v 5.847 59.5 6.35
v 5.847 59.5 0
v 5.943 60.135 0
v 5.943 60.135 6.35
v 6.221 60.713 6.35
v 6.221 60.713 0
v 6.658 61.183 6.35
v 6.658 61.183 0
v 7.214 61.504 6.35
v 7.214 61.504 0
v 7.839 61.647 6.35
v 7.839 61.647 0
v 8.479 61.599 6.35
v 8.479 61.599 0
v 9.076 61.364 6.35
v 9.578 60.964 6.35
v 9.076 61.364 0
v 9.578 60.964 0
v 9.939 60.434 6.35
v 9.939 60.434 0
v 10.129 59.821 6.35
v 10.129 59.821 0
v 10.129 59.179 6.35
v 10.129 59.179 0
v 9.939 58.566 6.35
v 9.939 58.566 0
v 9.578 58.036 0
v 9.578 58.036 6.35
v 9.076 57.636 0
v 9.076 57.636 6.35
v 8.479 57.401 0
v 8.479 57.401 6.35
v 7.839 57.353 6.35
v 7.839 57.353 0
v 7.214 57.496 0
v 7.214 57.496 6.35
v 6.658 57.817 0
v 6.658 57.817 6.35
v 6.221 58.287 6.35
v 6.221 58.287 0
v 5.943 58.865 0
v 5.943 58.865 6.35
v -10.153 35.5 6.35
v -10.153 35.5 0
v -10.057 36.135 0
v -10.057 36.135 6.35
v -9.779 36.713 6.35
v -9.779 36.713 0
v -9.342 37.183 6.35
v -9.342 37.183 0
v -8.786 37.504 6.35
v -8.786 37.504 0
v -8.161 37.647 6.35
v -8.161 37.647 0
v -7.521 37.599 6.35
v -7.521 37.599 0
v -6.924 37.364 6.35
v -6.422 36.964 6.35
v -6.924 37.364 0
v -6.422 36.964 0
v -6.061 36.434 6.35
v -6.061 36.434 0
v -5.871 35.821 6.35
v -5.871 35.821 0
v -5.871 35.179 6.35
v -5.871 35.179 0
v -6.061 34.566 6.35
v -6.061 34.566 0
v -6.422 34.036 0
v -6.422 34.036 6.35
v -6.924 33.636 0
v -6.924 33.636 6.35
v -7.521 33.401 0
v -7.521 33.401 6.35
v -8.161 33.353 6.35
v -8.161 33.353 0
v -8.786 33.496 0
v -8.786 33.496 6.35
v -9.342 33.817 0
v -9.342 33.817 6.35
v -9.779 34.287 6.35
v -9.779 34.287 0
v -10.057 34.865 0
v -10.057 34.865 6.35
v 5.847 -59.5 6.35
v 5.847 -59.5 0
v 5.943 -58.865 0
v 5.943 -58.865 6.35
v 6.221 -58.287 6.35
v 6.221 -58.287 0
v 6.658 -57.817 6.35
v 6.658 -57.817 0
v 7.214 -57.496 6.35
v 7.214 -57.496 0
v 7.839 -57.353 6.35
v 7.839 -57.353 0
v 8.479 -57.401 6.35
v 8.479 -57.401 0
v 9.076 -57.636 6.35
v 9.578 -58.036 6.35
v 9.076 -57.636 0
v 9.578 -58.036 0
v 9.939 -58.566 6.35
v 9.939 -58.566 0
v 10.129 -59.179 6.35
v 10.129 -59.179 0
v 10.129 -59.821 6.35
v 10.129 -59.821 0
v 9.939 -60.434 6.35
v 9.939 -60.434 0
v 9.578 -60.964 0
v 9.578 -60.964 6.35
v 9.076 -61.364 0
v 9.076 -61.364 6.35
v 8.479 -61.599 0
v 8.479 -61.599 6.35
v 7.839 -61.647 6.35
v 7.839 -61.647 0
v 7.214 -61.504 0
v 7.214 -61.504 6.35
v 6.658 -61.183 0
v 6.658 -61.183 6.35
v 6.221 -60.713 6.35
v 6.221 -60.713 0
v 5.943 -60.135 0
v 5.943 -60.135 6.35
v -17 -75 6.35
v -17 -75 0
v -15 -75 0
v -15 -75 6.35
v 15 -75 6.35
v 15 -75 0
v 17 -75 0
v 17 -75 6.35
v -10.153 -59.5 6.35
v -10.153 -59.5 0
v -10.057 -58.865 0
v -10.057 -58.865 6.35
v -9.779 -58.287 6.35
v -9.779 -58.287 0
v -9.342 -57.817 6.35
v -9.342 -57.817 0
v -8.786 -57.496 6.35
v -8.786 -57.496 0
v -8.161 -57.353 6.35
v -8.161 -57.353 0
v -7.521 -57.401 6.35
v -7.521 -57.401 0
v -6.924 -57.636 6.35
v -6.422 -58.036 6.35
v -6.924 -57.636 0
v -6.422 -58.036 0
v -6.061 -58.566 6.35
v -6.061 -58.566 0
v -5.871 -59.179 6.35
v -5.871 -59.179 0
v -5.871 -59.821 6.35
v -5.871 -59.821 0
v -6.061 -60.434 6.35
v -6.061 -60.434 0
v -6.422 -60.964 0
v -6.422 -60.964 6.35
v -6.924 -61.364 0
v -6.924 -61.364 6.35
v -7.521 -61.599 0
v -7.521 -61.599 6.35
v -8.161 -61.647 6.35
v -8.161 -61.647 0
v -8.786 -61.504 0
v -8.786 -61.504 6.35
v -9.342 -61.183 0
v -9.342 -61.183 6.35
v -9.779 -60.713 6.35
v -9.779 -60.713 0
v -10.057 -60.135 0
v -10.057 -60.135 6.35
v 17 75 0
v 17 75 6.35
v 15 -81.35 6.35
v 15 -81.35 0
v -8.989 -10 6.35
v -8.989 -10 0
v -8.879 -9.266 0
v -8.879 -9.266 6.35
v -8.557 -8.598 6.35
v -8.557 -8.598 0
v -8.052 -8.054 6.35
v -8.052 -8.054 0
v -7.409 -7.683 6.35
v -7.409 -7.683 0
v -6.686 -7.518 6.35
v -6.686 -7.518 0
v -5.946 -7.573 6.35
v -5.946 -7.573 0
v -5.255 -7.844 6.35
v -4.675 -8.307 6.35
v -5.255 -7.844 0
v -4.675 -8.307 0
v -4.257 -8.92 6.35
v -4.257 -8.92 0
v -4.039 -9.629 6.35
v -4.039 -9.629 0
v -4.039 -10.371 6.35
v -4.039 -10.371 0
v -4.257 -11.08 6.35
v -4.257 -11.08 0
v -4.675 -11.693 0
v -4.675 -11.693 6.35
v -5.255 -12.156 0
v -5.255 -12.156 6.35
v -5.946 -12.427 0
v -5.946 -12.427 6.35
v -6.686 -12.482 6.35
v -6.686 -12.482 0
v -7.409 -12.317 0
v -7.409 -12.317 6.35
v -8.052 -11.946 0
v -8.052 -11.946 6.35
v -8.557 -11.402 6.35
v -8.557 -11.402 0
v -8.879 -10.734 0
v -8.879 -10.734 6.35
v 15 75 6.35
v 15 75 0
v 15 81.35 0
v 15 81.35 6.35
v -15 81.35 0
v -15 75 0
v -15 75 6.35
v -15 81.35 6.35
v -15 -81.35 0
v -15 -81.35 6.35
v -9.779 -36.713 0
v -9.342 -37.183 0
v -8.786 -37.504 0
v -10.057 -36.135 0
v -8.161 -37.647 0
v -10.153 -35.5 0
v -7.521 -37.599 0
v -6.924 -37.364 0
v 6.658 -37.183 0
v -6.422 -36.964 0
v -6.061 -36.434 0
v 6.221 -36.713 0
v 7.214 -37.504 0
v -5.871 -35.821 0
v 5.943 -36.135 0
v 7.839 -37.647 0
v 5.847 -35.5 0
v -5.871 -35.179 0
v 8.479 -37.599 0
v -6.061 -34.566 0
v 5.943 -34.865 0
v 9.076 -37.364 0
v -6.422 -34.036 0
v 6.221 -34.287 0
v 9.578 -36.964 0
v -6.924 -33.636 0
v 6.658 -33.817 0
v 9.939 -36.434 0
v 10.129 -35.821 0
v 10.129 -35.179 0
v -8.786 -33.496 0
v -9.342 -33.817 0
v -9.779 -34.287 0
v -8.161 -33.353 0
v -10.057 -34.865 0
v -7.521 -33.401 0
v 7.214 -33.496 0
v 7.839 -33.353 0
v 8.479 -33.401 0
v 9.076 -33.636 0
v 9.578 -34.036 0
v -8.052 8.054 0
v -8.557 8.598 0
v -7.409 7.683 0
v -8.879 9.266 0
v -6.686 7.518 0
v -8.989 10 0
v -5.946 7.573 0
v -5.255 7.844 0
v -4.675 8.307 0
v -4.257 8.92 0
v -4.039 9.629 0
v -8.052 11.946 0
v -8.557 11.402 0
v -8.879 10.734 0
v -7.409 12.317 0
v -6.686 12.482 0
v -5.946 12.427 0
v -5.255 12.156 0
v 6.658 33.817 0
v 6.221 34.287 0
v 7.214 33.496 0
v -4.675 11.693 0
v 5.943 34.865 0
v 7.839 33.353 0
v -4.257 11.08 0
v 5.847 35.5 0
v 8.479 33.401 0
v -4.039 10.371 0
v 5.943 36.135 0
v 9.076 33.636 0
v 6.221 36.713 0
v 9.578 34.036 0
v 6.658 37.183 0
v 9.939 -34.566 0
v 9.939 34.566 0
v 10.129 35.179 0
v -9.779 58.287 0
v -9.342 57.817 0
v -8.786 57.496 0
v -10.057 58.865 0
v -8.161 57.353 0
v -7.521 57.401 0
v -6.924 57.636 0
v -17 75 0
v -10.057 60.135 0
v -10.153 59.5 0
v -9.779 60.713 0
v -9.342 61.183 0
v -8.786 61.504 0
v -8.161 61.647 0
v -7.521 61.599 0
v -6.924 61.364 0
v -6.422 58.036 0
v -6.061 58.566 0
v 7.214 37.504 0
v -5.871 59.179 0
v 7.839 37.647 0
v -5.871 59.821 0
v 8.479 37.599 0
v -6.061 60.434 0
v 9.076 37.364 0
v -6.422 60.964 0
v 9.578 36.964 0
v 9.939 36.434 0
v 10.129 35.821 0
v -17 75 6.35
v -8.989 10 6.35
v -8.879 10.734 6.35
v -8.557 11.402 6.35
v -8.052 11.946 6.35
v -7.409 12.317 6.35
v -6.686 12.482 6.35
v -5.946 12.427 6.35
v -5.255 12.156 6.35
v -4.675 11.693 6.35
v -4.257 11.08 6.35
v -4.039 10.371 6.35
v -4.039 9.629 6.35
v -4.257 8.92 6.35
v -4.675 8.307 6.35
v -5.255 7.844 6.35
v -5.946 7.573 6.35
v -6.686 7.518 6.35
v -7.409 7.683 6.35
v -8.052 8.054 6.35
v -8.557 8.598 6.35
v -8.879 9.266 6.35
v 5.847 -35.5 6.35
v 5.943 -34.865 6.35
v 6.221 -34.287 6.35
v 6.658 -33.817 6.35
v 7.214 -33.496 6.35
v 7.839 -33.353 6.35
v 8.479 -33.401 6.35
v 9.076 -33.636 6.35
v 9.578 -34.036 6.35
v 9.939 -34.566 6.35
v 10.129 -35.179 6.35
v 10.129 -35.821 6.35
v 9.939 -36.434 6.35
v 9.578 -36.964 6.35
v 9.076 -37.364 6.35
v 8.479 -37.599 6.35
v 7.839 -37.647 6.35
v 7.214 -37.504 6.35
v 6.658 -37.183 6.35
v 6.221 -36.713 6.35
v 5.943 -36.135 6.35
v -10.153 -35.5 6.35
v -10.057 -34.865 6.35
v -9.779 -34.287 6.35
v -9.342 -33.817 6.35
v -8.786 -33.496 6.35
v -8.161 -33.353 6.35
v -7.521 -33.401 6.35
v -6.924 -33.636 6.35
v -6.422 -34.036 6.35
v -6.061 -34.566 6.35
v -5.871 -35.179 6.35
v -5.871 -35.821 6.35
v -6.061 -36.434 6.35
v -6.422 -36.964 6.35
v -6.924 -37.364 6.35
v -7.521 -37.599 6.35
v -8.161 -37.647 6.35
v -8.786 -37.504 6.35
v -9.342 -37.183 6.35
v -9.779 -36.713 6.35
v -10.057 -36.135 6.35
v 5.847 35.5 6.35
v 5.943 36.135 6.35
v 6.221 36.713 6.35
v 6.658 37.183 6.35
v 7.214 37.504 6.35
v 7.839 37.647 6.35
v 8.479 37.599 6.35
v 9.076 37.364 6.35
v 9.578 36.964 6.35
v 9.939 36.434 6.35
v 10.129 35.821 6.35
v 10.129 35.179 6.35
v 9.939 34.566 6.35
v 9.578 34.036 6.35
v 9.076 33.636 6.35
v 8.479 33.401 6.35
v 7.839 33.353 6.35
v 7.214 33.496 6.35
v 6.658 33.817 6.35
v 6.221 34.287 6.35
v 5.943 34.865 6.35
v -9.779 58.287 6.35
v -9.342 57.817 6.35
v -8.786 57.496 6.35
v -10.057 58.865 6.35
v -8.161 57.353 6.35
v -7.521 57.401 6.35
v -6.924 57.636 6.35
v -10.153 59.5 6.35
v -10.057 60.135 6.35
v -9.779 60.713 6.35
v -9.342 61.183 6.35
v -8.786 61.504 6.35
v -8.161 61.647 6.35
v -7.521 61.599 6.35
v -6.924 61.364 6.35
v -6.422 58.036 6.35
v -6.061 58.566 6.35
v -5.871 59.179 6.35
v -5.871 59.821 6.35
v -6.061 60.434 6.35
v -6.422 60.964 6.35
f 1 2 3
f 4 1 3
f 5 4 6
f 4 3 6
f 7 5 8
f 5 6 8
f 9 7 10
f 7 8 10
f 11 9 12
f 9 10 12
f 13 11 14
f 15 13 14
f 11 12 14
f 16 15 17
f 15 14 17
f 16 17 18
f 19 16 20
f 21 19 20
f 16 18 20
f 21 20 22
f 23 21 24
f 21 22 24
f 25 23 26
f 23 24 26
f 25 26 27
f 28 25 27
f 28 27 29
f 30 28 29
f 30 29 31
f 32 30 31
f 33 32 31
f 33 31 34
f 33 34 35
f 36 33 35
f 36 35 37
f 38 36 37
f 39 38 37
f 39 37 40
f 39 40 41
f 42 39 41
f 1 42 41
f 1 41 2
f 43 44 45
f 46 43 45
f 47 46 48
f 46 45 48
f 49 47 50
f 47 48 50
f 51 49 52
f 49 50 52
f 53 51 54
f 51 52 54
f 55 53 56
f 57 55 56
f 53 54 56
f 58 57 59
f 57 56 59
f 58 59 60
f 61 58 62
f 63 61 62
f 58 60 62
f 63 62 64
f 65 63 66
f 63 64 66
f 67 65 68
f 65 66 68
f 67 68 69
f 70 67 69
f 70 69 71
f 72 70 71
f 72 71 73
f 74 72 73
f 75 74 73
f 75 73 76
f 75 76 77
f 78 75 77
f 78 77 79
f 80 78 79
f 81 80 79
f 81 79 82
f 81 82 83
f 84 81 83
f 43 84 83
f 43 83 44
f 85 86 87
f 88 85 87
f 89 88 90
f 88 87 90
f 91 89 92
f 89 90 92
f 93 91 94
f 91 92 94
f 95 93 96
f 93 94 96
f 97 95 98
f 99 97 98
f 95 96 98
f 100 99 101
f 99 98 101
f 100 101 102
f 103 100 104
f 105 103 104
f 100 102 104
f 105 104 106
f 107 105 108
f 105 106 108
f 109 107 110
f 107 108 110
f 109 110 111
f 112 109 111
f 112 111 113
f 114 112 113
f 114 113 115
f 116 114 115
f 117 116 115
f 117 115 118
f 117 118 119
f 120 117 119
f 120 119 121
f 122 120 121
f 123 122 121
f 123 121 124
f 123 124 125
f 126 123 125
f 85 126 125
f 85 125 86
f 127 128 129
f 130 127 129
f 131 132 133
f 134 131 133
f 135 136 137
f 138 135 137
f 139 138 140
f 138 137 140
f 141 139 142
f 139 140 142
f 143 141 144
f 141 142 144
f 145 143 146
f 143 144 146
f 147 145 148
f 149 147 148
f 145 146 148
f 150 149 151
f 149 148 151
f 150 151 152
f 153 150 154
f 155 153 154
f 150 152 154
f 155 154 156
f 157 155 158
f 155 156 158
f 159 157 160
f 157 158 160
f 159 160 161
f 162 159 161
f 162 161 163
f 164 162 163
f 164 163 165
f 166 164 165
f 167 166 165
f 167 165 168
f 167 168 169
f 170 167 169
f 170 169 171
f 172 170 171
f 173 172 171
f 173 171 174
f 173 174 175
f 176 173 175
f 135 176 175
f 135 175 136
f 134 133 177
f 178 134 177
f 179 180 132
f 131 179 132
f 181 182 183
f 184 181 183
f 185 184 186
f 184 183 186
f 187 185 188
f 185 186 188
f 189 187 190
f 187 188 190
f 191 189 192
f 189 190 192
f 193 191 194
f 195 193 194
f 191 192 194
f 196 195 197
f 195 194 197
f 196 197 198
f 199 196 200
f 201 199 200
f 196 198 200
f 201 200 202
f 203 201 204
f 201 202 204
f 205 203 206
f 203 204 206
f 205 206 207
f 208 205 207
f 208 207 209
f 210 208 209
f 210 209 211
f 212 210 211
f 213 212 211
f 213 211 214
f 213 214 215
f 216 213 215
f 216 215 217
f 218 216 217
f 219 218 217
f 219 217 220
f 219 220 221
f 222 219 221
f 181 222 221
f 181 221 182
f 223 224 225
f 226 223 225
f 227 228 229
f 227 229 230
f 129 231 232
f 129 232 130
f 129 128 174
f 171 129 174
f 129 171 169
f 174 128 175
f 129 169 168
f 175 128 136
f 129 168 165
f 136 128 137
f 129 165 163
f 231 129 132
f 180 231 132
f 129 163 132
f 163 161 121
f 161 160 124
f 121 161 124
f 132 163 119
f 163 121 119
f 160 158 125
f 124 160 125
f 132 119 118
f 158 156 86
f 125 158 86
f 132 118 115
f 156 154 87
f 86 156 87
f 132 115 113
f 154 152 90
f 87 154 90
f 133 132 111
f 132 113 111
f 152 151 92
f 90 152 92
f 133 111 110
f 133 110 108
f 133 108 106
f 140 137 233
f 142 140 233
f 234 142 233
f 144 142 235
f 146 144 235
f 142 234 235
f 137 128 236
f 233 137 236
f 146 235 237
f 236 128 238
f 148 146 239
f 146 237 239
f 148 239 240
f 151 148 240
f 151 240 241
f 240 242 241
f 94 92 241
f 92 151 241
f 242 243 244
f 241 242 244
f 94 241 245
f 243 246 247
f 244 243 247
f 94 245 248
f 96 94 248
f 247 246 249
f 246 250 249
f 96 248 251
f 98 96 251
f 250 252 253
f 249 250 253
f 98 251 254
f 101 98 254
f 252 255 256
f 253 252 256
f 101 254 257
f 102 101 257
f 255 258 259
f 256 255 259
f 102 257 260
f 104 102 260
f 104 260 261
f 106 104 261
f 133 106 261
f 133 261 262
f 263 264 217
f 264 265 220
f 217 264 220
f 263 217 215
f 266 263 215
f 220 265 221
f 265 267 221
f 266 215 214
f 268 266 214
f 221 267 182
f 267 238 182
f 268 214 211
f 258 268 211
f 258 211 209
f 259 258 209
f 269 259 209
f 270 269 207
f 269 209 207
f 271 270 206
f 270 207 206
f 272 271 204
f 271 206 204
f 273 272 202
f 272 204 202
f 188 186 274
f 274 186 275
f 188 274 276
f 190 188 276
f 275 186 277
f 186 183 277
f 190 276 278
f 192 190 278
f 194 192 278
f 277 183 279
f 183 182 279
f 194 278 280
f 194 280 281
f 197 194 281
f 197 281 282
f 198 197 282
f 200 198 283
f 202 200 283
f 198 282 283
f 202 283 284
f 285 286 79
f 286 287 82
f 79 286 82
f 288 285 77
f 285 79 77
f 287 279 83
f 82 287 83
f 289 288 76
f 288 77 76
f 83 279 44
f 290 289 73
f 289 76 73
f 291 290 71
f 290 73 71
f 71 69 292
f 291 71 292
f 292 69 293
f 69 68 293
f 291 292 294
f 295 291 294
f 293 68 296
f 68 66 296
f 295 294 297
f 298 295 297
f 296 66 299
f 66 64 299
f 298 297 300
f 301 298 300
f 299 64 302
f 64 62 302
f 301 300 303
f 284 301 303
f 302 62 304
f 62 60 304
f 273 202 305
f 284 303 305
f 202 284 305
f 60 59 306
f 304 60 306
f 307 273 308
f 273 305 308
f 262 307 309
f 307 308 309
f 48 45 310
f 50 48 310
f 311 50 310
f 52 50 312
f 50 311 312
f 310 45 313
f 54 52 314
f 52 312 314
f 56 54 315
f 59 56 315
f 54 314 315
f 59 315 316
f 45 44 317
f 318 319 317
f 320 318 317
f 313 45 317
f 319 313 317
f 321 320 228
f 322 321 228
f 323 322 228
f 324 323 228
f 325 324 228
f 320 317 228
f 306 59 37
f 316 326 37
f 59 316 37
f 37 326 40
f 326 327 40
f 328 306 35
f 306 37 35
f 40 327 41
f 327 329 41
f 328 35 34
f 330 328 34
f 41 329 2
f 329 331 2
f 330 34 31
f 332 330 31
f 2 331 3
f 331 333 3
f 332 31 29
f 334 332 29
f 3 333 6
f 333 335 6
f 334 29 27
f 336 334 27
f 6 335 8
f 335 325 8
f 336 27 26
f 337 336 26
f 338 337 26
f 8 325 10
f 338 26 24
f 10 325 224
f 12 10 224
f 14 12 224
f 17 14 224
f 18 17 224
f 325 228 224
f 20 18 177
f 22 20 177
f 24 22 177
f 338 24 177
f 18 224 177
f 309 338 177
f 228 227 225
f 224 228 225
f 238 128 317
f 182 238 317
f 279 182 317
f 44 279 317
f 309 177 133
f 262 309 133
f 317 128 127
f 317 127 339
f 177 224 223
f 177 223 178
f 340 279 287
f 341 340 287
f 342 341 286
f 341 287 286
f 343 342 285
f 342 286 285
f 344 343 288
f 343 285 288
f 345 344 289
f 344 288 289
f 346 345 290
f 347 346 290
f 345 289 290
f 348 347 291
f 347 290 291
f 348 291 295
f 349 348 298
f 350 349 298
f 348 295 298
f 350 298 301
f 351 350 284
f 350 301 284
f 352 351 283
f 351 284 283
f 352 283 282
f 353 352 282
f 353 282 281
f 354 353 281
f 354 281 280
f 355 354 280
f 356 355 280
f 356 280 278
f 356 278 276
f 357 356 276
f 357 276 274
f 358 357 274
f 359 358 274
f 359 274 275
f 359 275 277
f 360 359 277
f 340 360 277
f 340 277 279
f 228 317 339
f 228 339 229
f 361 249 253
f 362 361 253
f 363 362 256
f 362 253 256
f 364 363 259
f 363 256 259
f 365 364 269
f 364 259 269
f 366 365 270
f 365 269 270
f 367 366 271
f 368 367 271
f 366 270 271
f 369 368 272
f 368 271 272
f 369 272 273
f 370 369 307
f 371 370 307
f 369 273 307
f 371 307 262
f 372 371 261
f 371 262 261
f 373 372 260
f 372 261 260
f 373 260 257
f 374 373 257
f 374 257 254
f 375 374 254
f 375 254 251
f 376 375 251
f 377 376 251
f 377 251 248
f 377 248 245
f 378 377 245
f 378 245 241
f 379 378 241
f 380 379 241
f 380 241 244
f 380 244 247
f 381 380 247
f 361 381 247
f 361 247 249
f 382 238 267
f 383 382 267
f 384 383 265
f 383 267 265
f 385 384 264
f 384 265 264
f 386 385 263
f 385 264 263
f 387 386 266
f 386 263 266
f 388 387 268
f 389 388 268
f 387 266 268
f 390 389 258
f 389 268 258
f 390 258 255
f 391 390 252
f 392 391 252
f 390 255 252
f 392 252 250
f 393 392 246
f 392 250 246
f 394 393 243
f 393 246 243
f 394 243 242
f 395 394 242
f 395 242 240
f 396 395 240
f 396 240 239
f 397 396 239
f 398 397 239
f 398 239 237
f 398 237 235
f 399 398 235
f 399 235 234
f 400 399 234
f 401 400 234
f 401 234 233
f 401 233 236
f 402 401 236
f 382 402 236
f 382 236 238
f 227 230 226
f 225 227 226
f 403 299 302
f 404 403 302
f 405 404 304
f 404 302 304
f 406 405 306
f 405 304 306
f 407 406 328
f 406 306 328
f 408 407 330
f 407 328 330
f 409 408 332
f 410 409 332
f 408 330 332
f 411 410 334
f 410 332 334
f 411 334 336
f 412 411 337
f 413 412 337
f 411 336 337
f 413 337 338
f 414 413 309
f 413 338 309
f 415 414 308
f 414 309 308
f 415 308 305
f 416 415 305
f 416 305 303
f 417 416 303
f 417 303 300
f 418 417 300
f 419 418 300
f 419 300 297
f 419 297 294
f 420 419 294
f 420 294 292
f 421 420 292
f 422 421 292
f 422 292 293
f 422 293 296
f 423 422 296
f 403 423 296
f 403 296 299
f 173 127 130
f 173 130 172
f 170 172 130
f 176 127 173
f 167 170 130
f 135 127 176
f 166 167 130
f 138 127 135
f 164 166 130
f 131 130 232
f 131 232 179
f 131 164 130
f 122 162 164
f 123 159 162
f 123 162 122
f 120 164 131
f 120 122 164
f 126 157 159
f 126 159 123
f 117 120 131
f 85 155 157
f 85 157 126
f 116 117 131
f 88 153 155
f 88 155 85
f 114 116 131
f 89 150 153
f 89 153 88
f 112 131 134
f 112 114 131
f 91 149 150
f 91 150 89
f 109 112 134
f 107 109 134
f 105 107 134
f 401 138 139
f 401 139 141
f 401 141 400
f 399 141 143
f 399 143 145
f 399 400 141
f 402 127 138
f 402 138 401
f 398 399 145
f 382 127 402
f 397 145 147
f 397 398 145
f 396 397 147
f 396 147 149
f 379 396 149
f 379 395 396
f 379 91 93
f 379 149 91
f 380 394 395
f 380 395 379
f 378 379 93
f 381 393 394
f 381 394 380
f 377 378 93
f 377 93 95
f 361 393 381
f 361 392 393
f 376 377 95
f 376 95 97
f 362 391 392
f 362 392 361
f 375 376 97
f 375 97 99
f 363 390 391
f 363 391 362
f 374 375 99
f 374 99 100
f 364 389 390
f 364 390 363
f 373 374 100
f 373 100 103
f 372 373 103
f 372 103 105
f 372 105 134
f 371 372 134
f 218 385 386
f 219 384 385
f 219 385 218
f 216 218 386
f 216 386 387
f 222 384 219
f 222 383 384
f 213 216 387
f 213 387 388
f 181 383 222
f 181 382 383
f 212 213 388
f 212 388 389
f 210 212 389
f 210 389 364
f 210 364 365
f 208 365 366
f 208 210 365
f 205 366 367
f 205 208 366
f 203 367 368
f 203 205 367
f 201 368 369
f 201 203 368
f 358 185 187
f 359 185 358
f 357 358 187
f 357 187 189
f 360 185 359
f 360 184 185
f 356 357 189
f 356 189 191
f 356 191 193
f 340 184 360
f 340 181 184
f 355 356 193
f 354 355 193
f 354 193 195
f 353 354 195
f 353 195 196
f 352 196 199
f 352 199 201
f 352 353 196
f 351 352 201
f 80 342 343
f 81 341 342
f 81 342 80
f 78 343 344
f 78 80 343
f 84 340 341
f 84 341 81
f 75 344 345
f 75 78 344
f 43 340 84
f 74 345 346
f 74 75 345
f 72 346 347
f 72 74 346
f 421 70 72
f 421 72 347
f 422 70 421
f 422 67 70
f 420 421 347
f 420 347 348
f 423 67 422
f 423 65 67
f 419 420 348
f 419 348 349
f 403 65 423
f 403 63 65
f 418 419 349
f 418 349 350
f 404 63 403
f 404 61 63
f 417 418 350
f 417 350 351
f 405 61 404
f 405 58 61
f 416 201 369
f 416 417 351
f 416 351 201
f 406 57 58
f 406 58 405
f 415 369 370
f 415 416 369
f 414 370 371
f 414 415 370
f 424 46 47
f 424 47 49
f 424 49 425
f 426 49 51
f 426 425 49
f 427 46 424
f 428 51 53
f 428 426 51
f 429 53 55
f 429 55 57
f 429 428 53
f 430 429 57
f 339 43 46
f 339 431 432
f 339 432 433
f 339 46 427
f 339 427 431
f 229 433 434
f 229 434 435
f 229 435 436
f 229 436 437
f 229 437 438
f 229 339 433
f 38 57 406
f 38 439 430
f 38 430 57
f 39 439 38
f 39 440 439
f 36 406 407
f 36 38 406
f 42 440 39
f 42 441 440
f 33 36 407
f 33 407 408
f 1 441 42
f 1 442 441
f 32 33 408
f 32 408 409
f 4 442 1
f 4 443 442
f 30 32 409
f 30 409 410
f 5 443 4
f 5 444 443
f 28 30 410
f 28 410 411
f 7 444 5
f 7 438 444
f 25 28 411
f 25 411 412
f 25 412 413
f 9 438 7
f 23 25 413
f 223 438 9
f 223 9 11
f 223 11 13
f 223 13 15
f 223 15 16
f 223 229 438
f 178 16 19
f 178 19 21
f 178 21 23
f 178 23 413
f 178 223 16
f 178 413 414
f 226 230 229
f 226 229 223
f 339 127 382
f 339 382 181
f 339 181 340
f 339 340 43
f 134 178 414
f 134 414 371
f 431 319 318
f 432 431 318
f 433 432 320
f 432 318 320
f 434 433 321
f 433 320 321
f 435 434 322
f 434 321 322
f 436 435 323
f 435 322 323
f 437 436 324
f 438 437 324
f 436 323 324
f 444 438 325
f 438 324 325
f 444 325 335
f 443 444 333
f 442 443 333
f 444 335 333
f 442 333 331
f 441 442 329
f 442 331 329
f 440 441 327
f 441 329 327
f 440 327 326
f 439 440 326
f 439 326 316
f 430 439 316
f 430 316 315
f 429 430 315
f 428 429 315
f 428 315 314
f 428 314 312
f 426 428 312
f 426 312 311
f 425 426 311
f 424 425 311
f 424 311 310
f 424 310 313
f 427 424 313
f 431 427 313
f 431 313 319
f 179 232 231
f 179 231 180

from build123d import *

# Parameters (mm, degrees)
SKETCH1_W              = 34
SKETCH1_H              = 150
BOSS_EXTRUDE1_DEPTH    = 6.35
SKETCH3_W              = 30
SKETCH3_H              = 6.35
BOSS_EXTRUDE2_DEPTH    = 6.35
F_8_CLEARANCE_HOLE1_D  = 4.3053
F_10_CLEARANCE_HOLE1_D = 4.9784


with BuildPart() as part:
    # Sketch1 → Boss-Extrude1 (new body)
    with BuildSketch(Plane.XY):
        Rectangle(SKETCH1_W, SKETCH1_H)
    extrude(amount=BOSS_EXTRUDE1_DEPTH)

    # Sketch3 → Boss-Extrude2 (add)
    with BuildSketch(Plane.XY.offset(6.35)):
        with Locations((0, 78.175)):
            Rectangle(SKETCH3_W, SKETCH3_H)
        with Locations((0, -78.175)):
            Rectangle(SKETCH3_W, SKETCH3_H)
    extrude(amount=-BOSS_EXTRUDE2_DEPTH)

    # #8 Clearance Hole1 (through all)
    with Locations(Plane.XY.offset(6.35)):
        with Locations((-8, 59.5), (8, 59.5), (8, 35.5), (-8, 35.5), (-8, -35.5), (-8, -59.5), (8, -59.5), (8, -35.5)):
            Hole(F_8_CLEARANCE_HOLE1_D / 2)

    # #10 Clearance Hole1 (through all)
    with Locations(Plane.XY.offset(6.35)):
        with Locations((-6.5, 10), (-6.5, -10)):
            Hole(F_10_CLEARANCE_HOLE1_D / 2)


solid = part.part
